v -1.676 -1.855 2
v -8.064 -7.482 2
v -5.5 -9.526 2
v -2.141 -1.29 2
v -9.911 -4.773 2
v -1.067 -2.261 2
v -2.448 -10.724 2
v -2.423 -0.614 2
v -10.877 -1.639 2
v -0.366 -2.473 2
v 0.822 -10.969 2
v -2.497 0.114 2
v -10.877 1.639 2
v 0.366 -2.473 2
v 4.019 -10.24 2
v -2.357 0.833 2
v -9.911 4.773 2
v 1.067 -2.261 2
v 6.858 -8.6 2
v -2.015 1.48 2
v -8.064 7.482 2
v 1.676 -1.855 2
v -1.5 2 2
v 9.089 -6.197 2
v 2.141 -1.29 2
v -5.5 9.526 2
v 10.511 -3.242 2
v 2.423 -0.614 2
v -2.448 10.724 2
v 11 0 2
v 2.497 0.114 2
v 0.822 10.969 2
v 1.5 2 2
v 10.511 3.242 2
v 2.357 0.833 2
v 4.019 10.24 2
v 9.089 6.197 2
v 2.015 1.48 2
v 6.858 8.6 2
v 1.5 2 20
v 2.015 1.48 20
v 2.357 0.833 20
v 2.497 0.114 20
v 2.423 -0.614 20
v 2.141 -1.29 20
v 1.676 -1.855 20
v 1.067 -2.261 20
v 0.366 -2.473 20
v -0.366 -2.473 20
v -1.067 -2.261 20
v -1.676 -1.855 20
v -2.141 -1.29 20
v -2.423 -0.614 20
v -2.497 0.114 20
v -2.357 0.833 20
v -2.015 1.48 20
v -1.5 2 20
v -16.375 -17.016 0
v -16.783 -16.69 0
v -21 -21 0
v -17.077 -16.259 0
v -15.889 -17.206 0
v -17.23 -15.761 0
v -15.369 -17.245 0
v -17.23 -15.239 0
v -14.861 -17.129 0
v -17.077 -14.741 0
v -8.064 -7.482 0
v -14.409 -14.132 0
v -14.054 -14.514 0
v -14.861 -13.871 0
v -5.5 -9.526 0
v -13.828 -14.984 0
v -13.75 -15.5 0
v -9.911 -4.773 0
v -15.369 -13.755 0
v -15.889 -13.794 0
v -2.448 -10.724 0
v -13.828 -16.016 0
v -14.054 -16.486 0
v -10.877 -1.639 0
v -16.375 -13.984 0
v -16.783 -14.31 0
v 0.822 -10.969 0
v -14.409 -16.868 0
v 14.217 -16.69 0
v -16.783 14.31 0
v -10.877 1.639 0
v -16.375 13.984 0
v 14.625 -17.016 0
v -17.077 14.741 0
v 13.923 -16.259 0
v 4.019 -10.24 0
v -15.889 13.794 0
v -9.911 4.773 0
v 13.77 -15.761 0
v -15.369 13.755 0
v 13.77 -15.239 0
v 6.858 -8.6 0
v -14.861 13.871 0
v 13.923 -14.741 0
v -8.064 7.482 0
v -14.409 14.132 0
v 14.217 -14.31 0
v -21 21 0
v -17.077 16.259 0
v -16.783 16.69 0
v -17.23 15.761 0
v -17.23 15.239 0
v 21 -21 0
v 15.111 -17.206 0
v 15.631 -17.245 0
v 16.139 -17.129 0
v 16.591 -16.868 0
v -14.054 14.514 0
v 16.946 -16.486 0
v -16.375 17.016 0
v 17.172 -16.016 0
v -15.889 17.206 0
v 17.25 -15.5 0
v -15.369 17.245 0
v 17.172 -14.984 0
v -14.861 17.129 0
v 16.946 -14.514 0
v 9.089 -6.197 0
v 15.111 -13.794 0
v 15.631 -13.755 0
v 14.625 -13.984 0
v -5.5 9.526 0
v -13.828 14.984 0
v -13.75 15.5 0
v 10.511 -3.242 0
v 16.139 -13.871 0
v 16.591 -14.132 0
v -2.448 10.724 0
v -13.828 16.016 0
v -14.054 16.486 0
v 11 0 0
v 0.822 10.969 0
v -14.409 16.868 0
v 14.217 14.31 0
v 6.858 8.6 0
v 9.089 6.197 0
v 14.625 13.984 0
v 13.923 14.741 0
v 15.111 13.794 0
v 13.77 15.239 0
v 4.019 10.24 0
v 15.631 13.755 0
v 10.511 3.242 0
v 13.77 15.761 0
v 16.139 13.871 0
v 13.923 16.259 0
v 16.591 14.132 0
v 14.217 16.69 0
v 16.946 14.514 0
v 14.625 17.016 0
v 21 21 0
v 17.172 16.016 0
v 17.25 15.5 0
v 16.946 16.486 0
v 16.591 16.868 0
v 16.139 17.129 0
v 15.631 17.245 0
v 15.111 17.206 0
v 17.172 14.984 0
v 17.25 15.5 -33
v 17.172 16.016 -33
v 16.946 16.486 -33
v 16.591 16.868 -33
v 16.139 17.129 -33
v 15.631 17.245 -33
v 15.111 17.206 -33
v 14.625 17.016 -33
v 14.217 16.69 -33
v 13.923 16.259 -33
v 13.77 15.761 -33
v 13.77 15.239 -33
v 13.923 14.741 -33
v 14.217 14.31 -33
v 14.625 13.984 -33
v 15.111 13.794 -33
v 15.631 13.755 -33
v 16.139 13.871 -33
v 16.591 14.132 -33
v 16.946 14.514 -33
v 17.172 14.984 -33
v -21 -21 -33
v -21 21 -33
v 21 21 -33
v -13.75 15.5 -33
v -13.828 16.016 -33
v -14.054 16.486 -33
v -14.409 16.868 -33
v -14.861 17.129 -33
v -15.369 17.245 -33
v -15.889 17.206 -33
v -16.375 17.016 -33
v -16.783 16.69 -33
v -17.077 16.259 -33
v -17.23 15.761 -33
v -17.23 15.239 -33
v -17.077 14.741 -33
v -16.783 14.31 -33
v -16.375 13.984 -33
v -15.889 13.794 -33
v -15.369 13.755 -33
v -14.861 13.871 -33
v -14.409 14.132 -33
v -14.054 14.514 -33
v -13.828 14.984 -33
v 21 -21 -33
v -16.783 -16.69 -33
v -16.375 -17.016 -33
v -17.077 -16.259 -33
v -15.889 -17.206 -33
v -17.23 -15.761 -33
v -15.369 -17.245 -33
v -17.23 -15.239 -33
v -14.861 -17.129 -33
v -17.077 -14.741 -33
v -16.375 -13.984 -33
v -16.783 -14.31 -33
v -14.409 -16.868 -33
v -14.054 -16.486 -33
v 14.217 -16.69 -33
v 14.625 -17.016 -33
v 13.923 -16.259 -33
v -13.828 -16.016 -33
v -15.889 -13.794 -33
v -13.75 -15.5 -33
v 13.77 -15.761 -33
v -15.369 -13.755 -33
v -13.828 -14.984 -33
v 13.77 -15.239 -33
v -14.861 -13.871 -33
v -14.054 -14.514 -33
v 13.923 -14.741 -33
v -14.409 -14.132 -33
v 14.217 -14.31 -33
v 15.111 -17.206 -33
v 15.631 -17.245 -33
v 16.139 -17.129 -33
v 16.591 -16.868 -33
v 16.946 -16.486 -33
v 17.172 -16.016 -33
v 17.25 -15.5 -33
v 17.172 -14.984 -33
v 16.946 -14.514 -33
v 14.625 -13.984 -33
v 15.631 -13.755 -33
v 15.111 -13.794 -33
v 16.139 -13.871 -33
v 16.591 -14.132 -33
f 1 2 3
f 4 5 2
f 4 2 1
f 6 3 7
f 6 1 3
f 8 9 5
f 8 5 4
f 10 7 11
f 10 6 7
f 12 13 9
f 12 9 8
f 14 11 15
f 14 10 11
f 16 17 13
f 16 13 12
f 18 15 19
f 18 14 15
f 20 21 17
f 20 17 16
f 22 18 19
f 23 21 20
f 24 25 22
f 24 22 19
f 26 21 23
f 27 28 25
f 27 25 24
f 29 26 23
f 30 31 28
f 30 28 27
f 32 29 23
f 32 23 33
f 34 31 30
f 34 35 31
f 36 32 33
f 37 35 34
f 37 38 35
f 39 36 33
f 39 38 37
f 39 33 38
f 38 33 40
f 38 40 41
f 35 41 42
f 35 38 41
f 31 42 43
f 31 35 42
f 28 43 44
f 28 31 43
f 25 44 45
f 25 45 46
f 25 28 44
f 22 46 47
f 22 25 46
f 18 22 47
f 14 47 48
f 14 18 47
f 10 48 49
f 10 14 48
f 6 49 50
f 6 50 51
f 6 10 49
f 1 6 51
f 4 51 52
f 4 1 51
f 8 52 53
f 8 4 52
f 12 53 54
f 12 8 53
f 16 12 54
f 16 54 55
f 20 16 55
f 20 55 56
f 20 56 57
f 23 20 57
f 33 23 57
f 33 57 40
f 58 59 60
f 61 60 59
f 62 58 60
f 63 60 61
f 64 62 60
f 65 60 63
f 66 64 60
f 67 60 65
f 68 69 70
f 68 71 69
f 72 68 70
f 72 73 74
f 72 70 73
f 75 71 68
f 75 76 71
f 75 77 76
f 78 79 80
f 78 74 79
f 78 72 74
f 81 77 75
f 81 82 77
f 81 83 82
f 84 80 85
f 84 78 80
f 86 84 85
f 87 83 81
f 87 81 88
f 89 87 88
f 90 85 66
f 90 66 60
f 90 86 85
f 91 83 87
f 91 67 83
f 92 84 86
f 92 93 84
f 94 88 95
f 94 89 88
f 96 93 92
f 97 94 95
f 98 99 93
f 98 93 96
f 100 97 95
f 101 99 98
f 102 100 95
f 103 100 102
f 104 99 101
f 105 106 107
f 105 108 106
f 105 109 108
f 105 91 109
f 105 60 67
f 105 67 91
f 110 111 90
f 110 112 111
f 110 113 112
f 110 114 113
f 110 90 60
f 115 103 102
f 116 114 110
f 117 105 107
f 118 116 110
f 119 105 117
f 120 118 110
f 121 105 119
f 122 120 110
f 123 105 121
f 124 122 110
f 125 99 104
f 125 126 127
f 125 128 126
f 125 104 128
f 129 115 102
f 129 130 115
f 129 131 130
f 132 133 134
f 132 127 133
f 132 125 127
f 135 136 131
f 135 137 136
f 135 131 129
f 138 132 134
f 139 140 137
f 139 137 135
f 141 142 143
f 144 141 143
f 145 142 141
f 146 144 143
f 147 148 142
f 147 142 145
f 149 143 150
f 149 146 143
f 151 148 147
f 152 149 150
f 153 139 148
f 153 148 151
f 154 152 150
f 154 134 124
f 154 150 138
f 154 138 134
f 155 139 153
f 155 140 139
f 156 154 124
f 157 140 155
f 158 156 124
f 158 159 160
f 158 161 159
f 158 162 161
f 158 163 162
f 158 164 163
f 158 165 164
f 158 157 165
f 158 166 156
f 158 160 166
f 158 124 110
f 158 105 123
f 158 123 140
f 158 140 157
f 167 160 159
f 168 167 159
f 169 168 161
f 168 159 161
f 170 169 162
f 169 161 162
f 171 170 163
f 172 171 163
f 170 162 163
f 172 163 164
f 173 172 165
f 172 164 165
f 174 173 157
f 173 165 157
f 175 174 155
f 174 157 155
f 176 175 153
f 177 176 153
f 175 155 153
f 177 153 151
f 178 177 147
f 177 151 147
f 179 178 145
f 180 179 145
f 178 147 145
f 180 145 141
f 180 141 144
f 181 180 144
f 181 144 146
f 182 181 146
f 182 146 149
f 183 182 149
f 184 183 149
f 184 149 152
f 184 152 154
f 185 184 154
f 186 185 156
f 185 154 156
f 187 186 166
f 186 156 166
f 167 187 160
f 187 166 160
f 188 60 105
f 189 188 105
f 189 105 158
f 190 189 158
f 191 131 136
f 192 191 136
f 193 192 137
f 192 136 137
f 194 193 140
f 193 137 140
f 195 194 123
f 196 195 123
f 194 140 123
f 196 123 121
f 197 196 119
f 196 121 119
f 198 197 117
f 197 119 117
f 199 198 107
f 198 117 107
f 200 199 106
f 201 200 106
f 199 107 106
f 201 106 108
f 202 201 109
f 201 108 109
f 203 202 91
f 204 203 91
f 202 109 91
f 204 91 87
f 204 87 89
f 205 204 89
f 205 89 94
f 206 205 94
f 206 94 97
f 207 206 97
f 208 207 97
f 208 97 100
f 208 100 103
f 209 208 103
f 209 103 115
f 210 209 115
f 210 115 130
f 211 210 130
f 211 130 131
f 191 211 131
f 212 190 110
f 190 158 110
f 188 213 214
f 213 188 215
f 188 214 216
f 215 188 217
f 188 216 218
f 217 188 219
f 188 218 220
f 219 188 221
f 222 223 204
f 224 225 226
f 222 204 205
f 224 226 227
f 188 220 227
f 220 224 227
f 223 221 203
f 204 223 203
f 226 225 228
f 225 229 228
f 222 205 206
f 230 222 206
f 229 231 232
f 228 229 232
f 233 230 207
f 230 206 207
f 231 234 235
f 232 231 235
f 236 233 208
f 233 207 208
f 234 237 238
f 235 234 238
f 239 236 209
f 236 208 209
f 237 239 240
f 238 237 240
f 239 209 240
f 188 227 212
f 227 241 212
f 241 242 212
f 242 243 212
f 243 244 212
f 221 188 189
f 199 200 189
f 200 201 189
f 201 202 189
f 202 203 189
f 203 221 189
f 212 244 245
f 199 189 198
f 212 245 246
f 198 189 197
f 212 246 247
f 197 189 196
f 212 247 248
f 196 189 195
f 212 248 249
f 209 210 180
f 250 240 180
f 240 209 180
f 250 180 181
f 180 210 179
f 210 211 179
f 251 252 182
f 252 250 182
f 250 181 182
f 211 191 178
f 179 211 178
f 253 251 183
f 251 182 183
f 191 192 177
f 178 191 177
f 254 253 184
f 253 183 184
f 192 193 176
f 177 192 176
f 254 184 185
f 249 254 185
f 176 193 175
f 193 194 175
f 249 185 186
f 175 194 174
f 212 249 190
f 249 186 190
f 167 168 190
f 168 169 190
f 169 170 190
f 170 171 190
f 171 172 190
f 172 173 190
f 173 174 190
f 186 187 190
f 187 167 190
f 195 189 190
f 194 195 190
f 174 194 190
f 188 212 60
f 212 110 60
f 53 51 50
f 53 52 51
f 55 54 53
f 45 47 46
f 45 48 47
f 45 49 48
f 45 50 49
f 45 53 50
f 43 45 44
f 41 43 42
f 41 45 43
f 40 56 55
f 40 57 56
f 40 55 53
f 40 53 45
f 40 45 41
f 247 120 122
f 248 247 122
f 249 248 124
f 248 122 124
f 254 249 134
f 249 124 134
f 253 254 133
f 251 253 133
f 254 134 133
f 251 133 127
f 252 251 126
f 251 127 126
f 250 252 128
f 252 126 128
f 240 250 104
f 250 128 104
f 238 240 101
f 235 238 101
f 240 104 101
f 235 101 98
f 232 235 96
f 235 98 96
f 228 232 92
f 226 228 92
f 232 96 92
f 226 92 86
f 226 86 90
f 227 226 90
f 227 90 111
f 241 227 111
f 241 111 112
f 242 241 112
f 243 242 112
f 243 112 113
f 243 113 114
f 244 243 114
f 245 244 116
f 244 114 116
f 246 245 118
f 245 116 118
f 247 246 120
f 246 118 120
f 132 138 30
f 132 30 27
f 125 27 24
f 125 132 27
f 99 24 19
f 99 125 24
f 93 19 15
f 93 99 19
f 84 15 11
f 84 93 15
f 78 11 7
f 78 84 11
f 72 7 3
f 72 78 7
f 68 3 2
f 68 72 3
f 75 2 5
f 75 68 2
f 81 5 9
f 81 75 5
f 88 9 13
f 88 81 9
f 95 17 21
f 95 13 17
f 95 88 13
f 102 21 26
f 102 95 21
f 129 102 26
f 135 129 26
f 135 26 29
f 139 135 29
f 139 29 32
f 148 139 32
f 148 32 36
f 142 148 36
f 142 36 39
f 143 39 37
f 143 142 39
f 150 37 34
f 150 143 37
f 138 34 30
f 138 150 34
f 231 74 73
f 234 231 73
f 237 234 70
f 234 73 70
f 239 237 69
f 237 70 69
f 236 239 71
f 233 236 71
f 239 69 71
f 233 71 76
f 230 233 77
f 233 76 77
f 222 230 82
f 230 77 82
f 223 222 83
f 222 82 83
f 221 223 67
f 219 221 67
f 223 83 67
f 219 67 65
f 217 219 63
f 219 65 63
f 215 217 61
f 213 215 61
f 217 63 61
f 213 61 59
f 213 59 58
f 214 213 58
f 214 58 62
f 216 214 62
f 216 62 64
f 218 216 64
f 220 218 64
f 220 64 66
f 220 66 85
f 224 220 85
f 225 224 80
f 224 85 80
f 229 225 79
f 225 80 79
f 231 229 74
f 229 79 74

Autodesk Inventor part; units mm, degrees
ref_plane "YZ Plane" through (0, 0, 0) normal (1, 0, 0) x (0, 1, 0)
ref_plane "XZ Plane" through (0, 0, 0) normal (0, 1, 0) x (-1, 0, 0)
ref_plane "XY Plane" through (0, 0, 0) normal (0, 0, 1) x (1, 0, 0)
sketch "Sketch1" plane through (0, 0, 0) normal (0, 0, 1) x (1, 0, 0)
  circle A0 centre (0, 0) radius 2.5
  line L0 (-15.5, 15.5) -> (15.5, 15.5) construction
  line L1 (15.5, 15.5) -> (15.5, -15.5) construction
  line L2 (15.5, -15.5) -> (-15.5, -15.5) construction
  line L3 (-15.5, -15.5) -> (-15.5, 15.5) construction
  line L4 (-15.5, 15.5) -> (15.5, -15.5) construction
  circle A1 centre (-15.5, 15.5) radius 1.75
  circle A2 centre (15.5, 15.5) radius 1.75
  circle A3 centre (15.5, -15.5) radius 1.75
  circle A4 centre (-15.5, -15.5) radius 1.75
  line L5 (-21, 21) -> (21, 21)
  line L6 (21, 21) -> (21, -21)
  line L7 (21, -21) -> (-21, -21)
  line L8 (-21, -21) -> (-21, 21)
  line L9 (-21, -21) -> (21, 21) construction
  dimension "d0" = 5
  dimension "d1" = 31
  dimension "d2" = 3.5
  dimension "d3" = 42
extrude "Extrusion1" add sketch "Sketch1" against normal blind 33 contours A0 | L5 L6 L7 L8
extrude "Extrusion2" add sketch "Sketch1" along normal blind 20 contours A0
sketch "Sketch2" plane through (0, 0, 0) normal (0, 0, 1) x (1, 0, 0)
  circle A0 centre (0, 0) radius 11
  dimension "d8" = 22
extrude "Extrusion3" add sketch "Sketch2" along normal blind 2
sketch "Sketch3" plane through (0, 0, 20) normal (0, 0, 1) x (1, 0, 0)
  circle A0 centre (0, 0) radius 2.5 projected
  line L0 (-1.5, 2) -> (1.5, 2)
  circle A1 centre (0, 0) radius 2.5 projected
  arc A2 (1.5, 2) -> (-1.5, 2) centre (0, 0) ccw
  dimension "d11" = 4.5
extrude "Extrusion4" cut sketch "Sketch3" against normal up to surface (18 mm away) contours L0 A0 picked at (-0.3466, 2.0912)
sketch "Sketch4" plane through (0, 0, 0) normal (0, 0, 1) x (1, 0, 0)
  circle A0 centre (-15.5, 15.5) radius 1.75 projected
  circle A1 centre (-15.5, 15.5) radius 3
  circle A2 centre (15.5, 15.5) radius 1.75 projected
  circle A3 centre (15.5, 15.5) radius 3
  point P0 (0, 0)
  dimension "d14" = 6
  dimension "d15" = 6
properties part number "stepper"
